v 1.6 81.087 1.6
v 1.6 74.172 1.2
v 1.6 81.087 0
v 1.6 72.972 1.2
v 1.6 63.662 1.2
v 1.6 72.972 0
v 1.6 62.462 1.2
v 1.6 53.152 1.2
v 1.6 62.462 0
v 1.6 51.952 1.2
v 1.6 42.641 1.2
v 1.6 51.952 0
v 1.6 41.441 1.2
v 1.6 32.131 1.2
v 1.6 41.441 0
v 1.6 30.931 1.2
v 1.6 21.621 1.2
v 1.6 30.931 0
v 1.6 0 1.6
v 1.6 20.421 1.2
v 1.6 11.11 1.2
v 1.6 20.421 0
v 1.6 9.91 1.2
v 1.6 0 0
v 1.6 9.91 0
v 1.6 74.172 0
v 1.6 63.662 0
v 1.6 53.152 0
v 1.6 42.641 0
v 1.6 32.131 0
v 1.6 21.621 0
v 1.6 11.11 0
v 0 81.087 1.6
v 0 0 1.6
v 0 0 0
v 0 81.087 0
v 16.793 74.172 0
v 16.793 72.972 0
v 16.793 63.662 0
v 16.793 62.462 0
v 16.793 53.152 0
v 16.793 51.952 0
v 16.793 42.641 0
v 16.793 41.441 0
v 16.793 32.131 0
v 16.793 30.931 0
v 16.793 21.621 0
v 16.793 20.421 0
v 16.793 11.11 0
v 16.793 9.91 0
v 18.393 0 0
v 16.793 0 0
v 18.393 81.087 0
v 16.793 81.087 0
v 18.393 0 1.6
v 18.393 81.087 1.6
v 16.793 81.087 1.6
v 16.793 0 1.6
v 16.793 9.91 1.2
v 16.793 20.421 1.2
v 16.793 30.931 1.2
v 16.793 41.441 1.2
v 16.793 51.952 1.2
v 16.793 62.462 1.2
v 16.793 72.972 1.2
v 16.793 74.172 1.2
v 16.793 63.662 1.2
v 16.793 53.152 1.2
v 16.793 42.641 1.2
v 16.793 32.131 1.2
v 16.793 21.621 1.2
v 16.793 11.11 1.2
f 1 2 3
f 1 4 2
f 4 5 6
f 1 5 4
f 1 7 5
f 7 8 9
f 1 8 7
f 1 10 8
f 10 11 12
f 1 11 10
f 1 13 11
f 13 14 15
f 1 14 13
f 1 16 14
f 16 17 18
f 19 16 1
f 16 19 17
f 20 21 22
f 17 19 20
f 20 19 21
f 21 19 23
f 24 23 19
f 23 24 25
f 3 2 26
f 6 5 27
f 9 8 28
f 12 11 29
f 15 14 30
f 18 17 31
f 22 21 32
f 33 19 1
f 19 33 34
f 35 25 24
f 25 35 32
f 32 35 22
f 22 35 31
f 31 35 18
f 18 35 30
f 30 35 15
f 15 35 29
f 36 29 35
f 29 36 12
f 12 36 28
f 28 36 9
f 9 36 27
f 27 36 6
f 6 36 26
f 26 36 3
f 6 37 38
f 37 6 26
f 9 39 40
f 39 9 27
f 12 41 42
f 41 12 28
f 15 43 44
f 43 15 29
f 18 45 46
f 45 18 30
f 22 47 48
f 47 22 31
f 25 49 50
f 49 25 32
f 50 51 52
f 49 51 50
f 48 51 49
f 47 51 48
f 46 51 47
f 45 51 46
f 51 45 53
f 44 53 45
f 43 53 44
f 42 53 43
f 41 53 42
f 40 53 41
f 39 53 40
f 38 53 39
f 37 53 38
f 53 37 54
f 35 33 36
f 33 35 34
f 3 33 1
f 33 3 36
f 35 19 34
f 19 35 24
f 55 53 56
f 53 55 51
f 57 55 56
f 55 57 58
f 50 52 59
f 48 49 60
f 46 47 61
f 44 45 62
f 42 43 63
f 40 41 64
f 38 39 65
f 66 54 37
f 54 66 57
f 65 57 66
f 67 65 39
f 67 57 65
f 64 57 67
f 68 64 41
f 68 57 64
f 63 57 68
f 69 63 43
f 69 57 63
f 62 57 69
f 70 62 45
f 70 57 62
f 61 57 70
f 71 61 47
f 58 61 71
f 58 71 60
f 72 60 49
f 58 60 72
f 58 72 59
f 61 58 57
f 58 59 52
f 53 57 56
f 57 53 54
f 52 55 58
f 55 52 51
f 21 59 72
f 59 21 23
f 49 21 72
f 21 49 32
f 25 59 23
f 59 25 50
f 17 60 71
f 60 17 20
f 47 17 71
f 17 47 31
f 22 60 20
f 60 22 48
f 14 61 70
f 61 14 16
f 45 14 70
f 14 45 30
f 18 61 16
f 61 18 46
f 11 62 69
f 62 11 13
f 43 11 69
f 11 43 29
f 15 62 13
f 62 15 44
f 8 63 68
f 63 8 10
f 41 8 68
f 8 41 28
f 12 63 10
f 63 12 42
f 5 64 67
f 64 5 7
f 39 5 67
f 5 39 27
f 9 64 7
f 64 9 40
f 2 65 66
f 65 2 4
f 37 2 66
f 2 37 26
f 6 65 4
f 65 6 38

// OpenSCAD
// =====================================================================
//  VIEW 11: LADDER  -  print 2
//  Milwaukee Road 1939 rib side bay window caboose - G scale (1:29)
//  End ladder
//  Print orientation: flat
//
//  Open this file in OpenSCAD to look at just this part.
//  To export this part's STL: Render (F6), then File > Export > STL.
//  The part's code lives in library/ladder.scad; settings in
//  library/caboose_params.scad.
// =====================================================================

part     = "ladder";    // which part - leave as is
view     = "print";  // "print"     = laid out as it goes on the printer bed
                     //               (same as the exported STL)
                     // "installed" = in its place on the car (all copies)
show_car = false;    // with "installed": faint see-through body, roof and
                     //   underframe around it for context

include <../library/caboose_all.scad>

if (view == "installed") {
    caboose_installed(part);
    if (show_car) car_ghost();
} else {
    caboose_print(part);
}
echo(str("ladder: print 2"));
